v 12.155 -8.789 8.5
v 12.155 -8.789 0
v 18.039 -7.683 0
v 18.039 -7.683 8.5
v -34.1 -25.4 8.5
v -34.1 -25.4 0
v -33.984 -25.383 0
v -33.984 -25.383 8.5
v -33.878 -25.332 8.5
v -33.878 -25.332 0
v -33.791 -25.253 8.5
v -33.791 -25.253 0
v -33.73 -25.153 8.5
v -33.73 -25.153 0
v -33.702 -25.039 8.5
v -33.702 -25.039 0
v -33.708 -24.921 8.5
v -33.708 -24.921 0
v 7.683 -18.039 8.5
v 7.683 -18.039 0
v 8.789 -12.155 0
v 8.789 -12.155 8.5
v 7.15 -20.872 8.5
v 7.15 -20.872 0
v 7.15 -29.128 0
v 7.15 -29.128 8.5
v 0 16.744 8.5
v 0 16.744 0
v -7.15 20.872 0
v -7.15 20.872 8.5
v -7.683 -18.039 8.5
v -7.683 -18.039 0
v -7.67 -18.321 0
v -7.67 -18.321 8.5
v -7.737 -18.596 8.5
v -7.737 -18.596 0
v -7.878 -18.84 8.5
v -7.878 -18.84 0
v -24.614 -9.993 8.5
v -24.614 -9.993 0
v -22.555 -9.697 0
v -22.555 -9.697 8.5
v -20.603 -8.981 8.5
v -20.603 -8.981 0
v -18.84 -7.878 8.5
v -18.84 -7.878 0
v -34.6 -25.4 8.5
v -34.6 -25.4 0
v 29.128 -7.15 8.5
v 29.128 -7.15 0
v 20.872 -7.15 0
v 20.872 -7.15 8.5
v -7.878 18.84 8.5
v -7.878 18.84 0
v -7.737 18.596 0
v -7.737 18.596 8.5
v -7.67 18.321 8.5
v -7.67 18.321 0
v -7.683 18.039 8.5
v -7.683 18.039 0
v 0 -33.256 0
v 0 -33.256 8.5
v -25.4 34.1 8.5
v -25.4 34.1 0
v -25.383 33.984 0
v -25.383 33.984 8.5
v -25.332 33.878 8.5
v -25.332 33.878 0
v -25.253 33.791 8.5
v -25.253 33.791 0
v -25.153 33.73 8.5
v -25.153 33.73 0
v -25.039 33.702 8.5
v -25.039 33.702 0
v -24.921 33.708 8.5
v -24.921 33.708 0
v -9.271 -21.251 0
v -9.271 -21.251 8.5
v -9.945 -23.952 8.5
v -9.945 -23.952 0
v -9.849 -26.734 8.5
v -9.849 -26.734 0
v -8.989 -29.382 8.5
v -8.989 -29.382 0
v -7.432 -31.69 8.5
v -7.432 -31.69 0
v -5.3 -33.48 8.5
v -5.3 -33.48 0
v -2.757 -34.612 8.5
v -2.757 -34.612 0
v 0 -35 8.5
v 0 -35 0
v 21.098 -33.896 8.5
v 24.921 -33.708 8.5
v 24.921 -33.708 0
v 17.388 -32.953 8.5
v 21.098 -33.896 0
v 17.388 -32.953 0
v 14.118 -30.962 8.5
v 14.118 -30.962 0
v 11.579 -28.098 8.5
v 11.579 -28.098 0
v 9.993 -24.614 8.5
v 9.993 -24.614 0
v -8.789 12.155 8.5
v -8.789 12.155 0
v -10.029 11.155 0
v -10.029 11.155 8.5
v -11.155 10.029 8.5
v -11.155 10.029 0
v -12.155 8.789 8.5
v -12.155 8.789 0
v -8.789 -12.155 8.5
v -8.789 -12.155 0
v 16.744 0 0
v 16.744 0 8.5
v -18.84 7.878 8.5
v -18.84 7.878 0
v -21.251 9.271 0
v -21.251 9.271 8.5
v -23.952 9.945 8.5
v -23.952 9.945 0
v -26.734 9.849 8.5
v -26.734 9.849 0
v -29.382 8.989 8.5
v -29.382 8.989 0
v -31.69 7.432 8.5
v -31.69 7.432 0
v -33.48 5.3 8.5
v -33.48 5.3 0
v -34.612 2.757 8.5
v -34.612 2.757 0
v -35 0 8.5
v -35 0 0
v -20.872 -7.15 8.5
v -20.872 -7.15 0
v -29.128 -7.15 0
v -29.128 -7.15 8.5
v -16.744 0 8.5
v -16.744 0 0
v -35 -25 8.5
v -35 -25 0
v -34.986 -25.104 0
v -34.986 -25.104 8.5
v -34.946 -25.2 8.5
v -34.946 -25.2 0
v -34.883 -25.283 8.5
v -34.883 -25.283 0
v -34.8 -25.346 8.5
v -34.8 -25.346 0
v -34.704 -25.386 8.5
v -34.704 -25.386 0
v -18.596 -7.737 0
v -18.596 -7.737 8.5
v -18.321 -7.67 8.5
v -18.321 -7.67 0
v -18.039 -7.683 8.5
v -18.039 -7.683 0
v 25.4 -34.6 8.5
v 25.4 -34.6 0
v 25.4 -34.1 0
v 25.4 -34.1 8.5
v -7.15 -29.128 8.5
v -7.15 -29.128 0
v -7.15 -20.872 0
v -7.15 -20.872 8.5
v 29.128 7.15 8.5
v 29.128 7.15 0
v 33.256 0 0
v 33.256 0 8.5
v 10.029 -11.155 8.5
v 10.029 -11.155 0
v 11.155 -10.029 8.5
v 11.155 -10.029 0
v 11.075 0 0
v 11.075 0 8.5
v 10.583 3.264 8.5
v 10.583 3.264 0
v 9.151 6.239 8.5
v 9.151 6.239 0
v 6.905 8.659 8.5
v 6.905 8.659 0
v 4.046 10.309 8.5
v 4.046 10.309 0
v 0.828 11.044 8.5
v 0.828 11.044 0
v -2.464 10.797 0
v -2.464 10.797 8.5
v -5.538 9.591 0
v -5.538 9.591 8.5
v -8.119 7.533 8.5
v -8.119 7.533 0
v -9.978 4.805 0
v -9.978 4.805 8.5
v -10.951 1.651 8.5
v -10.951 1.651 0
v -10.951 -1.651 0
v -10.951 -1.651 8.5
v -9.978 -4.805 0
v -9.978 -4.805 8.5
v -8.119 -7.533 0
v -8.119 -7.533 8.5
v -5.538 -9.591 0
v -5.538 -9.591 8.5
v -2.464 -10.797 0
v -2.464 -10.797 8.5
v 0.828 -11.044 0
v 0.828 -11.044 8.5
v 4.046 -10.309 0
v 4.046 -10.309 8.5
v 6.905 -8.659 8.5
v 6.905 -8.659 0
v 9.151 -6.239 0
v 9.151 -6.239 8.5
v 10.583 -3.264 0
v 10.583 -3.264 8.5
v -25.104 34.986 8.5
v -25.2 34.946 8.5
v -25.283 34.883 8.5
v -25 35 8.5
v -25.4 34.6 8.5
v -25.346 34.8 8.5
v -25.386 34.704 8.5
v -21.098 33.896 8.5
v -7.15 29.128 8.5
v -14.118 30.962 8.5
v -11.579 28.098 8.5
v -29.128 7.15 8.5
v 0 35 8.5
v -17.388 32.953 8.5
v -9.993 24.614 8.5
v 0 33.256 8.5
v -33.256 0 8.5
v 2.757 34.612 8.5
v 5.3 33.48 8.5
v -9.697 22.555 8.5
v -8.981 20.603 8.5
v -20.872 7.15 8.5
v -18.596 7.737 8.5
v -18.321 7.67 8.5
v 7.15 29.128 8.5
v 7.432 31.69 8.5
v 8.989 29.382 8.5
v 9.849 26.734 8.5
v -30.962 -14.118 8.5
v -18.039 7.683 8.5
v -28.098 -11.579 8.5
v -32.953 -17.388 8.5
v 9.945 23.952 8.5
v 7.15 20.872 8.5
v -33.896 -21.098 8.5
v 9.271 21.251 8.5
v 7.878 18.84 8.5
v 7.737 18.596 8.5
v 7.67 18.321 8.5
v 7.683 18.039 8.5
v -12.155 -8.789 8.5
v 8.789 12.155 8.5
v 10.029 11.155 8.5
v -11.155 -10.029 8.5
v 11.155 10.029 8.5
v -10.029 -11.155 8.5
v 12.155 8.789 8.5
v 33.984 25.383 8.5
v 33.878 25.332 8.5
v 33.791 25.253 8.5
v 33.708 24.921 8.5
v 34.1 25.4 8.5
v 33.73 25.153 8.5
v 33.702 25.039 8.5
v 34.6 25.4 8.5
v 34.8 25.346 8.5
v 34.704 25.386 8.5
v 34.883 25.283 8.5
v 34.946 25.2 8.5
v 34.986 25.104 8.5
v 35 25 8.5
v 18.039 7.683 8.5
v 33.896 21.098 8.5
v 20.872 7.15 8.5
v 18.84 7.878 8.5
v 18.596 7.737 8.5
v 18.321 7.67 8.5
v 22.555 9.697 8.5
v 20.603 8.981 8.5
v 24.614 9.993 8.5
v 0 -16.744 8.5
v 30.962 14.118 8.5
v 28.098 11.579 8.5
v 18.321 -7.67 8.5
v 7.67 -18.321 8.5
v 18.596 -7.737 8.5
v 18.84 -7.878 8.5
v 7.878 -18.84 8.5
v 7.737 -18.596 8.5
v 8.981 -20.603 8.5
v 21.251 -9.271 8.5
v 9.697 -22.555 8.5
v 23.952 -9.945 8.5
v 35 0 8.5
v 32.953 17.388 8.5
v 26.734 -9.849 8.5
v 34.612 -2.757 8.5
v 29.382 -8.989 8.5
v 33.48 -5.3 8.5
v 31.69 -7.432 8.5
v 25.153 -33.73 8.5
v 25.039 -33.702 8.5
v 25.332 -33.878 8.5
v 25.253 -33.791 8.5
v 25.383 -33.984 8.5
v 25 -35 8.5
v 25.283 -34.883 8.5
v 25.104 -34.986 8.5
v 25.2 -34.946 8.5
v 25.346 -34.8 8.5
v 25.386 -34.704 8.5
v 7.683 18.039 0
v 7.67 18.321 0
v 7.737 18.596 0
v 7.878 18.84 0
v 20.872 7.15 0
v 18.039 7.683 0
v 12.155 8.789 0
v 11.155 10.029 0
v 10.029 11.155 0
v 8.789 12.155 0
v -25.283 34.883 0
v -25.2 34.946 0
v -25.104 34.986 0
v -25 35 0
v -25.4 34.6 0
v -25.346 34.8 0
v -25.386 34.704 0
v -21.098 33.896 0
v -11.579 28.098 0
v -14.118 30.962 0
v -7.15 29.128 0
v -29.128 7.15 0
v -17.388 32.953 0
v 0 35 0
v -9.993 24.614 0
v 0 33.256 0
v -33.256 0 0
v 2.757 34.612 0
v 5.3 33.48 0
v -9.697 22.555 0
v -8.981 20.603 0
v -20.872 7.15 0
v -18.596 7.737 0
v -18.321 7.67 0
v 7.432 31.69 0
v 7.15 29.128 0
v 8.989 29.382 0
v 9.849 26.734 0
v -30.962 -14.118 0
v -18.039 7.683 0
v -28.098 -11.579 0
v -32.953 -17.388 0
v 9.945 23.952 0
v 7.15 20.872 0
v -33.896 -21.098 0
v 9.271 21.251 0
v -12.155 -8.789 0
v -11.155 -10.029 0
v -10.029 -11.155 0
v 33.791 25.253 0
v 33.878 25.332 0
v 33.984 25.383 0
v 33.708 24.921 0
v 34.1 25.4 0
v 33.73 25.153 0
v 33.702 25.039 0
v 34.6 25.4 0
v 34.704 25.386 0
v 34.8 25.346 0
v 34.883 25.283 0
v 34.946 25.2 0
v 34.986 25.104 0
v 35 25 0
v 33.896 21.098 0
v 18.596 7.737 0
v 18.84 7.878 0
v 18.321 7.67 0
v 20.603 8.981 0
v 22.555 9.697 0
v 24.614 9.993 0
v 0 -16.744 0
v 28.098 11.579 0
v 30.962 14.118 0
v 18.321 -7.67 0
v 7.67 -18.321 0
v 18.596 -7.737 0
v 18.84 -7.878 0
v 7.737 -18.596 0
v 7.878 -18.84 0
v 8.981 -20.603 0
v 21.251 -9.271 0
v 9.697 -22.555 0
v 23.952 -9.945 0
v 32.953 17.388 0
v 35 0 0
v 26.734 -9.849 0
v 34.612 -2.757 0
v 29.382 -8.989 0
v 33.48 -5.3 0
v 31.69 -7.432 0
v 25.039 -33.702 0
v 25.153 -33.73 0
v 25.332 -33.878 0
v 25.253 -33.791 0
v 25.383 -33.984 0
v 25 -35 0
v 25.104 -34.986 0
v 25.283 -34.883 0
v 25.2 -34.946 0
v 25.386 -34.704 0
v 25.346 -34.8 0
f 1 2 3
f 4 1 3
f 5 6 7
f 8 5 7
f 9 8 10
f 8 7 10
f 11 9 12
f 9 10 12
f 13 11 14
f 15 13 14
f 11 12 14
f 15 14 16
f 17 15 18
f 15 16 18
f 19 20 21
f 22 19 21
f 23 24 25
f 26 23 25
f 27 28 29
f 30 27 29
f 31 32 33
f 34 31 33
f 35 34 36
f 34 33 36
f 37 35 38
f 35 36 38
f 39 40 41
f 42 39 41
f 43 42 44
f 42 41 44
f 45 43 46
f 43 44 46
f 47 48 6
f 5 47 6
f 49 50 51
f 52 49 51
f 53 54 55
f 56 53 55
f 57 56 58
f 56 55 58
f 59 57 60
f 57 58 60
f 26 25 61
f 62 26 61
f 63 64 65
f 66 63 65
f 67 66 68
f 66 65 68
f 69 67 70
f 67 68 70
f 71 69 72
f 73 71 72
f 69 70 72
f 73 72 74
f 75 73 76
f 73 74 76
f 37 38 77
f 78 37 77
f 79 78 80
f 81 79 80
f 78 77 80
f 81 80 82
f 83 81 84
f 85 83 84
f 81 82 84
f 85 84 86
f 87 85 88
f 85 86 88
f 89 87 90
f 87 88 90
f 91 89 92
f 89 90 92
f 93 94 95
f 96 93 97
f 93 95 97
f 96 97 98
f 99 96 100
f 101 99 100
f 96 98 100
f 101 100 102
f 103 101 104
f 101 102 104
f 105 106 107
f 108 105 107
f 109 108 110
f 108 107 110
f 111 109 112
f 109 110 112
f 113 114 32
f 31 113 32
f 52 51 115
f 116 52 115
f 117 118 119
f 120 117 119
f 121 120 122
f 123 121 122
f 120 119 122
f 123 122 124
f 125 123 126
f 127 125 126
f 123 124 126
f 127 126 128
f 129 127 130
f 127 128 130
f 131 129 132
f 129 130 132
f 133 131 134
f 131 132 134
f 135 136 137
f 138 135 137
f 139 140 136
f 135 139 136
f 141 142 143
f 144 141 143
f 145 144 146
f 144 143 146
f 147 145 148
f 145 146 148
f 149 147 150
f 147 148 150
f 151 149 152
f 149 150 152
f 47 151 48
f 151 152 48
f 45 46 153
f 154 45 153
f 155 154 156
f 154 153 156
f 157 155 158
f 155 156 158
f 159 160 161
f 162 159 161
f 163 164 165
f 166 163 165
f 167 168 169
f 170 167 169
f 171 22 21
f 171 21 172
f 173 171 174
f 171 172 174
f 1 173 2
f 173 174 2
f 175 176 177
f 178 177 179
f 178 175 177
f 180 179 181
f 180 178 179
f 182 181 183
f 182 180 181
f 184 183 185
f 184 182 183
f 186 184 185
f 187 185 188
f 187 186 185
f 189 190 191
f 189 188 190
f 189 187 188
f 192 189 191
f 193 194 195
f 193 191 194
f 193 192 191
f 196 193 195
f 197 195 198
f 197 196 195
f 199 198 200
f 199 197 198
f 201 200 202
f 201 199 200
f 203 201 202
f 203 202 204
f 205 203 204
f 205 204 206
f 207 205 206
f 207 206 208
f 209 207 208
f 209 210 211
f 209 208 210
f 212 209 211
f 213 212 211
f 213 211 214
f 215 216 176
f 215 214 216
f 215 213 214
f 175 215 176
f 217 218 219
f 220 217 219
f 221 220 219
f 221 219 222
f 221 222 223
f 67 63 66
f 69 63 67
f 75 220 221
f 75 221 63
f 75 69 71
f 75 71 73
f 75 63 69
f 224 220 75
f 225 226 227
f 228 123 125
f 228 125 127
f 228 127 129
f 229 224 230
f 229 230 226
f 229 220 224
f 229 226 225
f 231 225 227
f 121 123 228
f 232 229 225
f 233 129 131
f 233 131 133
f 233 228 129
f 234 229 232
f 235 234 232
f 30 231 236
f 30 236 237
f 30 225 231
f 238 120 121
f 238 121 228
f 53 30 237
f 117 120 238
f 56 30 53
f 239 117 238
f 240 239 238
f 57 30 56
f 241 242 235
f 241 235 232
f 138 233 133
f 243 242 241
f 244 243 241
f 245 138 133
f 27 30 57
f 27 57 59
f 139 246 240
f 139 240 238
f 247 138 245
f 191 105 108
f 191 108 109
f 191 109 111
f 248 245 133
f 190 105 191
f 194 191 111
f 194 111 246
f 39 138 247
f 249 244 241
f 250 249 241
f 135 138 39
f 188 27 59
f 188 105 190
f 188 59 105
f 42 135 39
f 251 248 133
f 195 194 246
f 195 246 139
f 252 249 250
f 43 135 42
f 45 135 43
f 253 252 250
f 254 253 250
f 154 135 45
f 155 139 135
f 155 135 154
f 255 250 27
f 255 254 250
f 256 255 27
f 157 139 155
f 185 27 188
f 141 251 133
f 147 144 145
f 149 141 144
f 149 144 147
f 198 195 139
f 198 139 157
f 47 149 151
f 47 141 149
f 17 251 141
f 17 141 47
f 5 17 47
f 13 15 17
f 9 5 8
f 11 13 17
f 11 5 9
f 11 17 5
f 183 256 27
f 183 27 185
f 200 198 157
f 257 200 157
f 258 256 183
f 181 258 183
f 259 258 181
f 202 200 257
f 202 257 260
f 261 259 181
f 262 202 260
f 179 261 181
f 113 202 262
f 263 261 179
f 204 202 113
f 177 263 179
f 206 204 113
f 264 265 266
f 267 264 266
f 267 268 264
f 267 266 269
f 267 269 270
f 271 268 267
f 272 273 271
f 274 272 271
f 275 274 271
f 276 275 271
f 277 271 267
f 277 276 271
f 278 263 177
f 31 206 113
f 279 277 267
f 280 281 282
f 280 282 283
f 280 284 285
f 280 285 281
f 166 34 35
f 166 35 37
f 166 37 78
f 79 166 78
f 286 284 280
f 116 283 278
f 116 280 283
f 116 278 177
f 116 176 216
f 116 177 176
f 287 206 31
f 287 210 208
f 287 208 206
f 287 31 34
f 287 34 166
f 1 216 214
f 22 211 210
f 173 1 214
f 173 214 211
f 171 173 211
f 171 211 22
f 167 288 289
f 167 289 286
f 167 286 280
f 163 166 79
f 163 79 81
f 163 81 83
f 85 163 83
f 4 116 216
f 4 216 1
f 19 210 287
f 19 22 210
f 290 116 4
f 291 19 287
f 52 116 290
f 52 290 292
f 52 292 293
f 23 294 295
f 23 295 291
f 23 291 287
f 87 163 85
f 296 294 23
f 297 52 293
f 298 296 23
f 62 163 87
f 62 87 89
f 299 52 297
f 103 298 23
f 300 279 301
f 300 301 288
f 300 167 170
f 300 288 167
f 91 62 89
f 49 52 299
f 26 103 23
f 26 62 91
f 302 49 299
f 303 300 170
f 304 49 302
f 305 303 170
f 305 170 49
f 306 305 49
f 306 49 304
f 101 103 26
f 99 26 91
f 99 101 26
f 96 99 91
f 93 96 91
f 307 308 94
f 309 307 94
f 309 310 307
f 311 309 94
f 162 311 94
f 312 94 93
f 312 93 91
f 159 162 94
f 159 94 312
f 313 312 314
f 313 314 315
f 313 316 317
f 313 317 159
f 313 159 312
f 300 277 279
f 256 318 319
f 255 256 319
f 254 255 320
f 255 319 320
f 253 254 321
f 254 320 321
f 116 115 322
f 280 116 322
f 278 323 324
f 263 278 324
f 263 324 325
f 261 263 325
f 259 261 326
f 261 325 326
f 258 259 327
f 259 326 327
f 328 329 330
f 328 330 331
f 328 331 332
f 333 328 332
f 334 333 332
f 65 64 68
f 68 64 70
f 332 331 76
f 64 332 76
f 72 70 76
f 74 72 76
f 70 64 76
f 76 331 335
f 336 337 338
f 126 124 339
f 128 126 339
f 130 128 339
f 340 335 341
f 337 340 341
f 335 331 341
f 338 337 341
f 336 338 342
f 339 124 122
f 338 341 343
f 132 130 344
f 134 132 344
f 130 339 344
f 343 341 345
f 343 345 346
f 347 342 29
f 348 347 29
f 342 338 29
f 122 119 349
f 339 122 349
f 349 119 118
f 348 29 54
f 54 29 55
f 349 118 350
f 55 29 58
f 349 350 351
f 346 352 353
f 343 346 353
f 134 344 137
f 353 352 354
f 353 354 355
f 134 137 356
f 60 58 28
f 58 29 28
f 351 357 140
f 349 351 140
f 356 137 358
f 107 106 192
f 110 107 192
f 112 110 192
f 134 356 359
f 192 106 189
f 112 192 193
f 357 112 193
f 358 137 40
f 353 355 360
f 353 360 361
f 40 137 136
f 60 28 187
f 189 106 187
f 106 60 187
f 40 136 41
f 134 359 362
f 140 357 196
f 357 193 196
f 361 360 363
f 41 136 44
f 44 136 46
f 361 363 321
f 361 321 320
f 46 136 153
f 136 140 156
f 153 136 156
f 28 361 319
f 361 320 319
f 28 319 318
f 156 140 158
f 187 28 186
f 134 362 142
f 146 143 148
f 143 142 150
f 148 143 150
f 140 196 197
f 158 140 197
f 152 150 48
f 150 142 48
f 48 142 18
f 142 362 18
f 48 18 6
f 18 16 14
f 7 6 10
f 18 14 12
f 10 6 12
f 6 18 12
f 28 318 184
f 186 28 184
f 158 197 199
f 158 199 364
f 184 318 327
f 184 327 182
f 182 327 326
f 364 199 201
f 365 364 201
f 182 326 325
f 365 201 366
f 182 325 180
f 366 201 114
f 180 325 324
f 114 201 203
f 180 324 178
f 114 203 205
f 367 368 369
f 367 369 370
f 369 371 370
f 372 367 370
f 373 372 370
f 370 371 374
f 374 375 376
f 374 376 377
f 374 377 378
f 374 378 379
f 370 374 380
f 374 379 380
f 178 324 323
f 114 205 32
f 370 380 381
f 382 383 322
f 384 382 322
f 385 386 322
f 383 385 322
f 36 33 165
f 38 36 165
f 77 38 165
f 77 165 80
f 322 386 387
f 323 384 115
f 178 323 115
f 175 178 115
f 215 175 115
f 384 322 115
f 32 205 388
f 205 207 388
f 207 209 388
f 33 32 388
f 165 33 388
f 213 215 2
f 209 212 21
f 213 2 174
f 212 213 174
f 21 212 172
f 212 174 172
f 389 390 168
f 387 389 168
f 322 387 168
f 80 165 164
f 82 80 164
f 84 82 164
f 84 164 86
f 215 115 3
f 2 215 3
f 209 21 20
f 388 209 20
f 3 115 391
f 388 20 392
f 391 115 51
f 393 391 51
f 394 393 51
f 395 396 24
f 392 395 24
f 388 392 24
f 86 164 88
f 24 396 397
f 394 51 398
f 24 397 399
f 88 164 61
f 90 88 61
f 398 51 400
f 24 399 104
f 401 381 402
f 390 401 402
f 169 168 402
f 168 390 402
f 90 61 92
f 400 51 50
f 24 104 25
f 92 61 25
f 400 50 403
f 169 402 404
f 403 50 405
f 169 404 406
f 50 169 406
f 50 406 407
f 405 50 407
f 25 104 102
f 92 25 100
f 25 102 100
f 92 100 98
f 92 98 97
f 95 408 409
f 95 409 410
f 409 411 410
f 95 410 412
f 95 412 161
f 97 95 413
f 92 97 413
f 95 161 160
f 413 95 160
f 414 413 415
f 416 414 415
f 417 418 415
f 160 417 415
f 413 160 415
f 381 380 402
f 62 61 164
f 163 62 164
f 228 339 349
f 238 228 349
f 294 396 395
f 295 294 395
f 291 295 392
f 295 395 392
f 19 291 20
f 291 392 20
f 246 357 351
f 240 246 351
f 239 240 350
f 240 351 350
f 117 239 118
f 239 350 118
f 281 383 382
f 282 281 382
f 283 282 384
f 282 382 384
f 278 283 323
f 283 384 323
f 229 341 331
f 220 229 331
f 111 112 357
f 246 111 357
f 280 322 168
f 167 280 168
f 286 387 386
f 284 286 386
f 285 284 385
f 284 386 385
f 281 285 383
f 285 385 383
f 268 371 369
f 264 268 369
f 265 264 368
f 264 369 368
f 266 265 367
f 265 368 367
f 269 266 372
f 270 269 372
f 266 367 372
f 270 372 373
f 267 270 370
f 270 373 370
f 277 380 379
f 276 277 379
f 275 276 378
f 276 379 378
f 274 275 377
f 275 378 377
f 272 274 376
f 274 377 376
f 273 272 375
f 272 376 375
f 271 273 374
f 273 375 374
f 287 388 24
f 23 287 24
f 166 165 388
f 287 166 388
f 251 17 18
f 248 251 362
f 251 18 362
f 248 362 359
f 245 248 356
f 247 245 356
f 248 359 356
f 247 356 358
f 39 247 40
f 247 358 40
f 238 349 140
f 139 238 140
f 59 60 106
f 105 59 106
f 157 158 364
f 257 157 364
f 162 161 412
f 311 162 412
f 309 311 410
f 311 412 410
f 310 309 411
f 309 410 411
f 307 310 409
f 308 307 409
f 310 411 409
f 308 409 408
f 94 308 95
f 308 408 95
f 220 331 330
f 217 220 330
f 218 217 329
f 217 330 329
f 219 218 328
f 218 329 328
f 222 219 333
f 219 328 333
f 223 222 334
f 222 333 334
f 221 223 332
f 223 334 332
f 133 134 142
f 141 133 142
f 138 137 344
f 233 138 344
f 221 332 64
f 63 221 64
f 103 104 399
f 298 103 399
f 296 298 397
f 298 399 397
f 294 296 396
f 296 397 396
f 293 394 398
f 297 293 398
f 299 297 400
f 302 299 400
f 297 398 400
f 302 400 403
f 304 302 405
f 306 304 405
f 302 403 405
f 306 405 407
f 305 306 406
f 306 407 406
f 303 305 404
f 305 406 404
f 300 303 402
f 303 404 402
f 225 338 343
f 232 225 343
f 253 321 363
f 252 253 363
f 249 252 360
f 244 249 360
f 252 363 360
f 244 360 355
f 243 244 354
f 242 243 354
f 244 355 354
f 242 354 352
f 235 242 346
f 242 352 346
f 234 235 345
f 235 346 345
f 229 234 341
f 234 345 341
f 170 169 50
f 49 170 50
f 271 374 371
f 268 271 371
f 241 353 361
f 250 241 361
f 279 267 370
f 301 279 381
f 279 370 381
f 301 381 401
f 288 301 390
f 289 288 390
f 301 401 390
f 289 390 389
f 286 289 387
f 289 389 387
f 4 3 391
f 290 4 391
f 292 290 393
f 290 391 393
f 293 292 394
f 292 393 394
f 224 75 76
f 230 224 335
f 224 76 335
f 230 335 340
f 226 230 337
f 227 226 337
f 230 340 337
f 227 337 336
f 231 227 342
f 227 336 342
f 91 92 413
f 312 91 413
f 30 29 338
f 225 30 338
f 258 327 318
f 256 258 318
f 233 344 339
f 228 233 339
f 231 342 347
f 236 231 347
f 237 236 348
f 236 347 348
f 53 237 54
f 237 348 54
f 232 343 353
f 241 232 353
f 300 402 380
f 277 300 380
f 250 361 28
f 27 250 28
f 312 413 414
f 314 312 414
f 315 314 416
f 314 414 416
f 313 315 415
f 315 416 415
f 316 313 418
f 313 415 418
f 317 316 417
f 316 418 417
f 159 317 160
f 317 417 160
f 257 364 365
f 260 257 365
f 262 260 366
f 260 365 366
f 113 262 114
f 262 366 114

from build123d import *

# Parameters (mm, degrees)
F0_R     = 11.075
F2_DEPTH = 8.5
F3_COUNT = 4


# Not quite as in the source:
# - a feature names something its author has since deleted; it is built from what else it names


with BuildPart() as f2:
    # F0 (on Top) → F2 (new body)
    with BuildSketch(Plane.XY):
        with BuildLine():
            Line((-7.6826518036, 18.0394667333), (-8.7891866596, 12.1552539201))
            ThreePointArc((-8.7891866596, 12.1552539201), (0, -15), (8.7891866596, 12.1552539201))
            Line((8.7891866596, 12.1552539201), (7.6826518036, 18.0394667333))
            ThreePointArc((7.6826518036, 18.0394667333), (7.6938199579, 18.4608846247), (7.8776597121, 18.840253458))
            ThreePointArc((7.8776597121, 18.840253458), (8.9888115293, 29.3819250667), (0, 35))
            Line((0, 35), (-25, 35))
            ThreePointArc((-25, 35), (-25.2828427125, 34.8828427125), (-25.4, 34.6))
            Line((-25.4, 34.6), (-25.4, 34.1))
            ThreePointArc((-25.4, 34.1), (-25.2534392204, 33.7905350399), (-24.9211571922, 33.7078472088))
            ThreePointArc((-24.9211571922, 33.7078472088), (-15.6786460864, 32.0797048321), (-9.9925313497, 24.6135841297))
            ThreePointArc((-9.9925313497, 24.6135841297), (-9.3898226238, 21.5603443352), (-7.8776597121, 18.840253458))
            ThreePointArc((-7.8776597121, 18.840253458), (-7.6938199579, 18.4608846247), (-7.6826518036, 18.0394667333))
        make_face()
        Circle(F0_R, mode=Mode.SUBTRACT)
        Polygon((0, 33.2561088494), (7.15, 29.1280544247), (7.15, 20.8719455753), (0, 16.7438911506), (-7.15, 20.8719455753), (-7.15, 29.1280544247), align=None, mode=Mode.SUBTRACT)
    extrude(amount=F2_DEPTH)

    # F3: F2 ×4 about axis
    f3_axis = Axis((0, 0, 16.6777409613), (0, 0, 1))


with BuildPart() as f2_1:
    add(f2.part)
    for i in range(1, F3_COUNT):
        add(f2.part.rotate(f3_axis, i * 360 / F3_COUNT))


solid = f2_1.part
